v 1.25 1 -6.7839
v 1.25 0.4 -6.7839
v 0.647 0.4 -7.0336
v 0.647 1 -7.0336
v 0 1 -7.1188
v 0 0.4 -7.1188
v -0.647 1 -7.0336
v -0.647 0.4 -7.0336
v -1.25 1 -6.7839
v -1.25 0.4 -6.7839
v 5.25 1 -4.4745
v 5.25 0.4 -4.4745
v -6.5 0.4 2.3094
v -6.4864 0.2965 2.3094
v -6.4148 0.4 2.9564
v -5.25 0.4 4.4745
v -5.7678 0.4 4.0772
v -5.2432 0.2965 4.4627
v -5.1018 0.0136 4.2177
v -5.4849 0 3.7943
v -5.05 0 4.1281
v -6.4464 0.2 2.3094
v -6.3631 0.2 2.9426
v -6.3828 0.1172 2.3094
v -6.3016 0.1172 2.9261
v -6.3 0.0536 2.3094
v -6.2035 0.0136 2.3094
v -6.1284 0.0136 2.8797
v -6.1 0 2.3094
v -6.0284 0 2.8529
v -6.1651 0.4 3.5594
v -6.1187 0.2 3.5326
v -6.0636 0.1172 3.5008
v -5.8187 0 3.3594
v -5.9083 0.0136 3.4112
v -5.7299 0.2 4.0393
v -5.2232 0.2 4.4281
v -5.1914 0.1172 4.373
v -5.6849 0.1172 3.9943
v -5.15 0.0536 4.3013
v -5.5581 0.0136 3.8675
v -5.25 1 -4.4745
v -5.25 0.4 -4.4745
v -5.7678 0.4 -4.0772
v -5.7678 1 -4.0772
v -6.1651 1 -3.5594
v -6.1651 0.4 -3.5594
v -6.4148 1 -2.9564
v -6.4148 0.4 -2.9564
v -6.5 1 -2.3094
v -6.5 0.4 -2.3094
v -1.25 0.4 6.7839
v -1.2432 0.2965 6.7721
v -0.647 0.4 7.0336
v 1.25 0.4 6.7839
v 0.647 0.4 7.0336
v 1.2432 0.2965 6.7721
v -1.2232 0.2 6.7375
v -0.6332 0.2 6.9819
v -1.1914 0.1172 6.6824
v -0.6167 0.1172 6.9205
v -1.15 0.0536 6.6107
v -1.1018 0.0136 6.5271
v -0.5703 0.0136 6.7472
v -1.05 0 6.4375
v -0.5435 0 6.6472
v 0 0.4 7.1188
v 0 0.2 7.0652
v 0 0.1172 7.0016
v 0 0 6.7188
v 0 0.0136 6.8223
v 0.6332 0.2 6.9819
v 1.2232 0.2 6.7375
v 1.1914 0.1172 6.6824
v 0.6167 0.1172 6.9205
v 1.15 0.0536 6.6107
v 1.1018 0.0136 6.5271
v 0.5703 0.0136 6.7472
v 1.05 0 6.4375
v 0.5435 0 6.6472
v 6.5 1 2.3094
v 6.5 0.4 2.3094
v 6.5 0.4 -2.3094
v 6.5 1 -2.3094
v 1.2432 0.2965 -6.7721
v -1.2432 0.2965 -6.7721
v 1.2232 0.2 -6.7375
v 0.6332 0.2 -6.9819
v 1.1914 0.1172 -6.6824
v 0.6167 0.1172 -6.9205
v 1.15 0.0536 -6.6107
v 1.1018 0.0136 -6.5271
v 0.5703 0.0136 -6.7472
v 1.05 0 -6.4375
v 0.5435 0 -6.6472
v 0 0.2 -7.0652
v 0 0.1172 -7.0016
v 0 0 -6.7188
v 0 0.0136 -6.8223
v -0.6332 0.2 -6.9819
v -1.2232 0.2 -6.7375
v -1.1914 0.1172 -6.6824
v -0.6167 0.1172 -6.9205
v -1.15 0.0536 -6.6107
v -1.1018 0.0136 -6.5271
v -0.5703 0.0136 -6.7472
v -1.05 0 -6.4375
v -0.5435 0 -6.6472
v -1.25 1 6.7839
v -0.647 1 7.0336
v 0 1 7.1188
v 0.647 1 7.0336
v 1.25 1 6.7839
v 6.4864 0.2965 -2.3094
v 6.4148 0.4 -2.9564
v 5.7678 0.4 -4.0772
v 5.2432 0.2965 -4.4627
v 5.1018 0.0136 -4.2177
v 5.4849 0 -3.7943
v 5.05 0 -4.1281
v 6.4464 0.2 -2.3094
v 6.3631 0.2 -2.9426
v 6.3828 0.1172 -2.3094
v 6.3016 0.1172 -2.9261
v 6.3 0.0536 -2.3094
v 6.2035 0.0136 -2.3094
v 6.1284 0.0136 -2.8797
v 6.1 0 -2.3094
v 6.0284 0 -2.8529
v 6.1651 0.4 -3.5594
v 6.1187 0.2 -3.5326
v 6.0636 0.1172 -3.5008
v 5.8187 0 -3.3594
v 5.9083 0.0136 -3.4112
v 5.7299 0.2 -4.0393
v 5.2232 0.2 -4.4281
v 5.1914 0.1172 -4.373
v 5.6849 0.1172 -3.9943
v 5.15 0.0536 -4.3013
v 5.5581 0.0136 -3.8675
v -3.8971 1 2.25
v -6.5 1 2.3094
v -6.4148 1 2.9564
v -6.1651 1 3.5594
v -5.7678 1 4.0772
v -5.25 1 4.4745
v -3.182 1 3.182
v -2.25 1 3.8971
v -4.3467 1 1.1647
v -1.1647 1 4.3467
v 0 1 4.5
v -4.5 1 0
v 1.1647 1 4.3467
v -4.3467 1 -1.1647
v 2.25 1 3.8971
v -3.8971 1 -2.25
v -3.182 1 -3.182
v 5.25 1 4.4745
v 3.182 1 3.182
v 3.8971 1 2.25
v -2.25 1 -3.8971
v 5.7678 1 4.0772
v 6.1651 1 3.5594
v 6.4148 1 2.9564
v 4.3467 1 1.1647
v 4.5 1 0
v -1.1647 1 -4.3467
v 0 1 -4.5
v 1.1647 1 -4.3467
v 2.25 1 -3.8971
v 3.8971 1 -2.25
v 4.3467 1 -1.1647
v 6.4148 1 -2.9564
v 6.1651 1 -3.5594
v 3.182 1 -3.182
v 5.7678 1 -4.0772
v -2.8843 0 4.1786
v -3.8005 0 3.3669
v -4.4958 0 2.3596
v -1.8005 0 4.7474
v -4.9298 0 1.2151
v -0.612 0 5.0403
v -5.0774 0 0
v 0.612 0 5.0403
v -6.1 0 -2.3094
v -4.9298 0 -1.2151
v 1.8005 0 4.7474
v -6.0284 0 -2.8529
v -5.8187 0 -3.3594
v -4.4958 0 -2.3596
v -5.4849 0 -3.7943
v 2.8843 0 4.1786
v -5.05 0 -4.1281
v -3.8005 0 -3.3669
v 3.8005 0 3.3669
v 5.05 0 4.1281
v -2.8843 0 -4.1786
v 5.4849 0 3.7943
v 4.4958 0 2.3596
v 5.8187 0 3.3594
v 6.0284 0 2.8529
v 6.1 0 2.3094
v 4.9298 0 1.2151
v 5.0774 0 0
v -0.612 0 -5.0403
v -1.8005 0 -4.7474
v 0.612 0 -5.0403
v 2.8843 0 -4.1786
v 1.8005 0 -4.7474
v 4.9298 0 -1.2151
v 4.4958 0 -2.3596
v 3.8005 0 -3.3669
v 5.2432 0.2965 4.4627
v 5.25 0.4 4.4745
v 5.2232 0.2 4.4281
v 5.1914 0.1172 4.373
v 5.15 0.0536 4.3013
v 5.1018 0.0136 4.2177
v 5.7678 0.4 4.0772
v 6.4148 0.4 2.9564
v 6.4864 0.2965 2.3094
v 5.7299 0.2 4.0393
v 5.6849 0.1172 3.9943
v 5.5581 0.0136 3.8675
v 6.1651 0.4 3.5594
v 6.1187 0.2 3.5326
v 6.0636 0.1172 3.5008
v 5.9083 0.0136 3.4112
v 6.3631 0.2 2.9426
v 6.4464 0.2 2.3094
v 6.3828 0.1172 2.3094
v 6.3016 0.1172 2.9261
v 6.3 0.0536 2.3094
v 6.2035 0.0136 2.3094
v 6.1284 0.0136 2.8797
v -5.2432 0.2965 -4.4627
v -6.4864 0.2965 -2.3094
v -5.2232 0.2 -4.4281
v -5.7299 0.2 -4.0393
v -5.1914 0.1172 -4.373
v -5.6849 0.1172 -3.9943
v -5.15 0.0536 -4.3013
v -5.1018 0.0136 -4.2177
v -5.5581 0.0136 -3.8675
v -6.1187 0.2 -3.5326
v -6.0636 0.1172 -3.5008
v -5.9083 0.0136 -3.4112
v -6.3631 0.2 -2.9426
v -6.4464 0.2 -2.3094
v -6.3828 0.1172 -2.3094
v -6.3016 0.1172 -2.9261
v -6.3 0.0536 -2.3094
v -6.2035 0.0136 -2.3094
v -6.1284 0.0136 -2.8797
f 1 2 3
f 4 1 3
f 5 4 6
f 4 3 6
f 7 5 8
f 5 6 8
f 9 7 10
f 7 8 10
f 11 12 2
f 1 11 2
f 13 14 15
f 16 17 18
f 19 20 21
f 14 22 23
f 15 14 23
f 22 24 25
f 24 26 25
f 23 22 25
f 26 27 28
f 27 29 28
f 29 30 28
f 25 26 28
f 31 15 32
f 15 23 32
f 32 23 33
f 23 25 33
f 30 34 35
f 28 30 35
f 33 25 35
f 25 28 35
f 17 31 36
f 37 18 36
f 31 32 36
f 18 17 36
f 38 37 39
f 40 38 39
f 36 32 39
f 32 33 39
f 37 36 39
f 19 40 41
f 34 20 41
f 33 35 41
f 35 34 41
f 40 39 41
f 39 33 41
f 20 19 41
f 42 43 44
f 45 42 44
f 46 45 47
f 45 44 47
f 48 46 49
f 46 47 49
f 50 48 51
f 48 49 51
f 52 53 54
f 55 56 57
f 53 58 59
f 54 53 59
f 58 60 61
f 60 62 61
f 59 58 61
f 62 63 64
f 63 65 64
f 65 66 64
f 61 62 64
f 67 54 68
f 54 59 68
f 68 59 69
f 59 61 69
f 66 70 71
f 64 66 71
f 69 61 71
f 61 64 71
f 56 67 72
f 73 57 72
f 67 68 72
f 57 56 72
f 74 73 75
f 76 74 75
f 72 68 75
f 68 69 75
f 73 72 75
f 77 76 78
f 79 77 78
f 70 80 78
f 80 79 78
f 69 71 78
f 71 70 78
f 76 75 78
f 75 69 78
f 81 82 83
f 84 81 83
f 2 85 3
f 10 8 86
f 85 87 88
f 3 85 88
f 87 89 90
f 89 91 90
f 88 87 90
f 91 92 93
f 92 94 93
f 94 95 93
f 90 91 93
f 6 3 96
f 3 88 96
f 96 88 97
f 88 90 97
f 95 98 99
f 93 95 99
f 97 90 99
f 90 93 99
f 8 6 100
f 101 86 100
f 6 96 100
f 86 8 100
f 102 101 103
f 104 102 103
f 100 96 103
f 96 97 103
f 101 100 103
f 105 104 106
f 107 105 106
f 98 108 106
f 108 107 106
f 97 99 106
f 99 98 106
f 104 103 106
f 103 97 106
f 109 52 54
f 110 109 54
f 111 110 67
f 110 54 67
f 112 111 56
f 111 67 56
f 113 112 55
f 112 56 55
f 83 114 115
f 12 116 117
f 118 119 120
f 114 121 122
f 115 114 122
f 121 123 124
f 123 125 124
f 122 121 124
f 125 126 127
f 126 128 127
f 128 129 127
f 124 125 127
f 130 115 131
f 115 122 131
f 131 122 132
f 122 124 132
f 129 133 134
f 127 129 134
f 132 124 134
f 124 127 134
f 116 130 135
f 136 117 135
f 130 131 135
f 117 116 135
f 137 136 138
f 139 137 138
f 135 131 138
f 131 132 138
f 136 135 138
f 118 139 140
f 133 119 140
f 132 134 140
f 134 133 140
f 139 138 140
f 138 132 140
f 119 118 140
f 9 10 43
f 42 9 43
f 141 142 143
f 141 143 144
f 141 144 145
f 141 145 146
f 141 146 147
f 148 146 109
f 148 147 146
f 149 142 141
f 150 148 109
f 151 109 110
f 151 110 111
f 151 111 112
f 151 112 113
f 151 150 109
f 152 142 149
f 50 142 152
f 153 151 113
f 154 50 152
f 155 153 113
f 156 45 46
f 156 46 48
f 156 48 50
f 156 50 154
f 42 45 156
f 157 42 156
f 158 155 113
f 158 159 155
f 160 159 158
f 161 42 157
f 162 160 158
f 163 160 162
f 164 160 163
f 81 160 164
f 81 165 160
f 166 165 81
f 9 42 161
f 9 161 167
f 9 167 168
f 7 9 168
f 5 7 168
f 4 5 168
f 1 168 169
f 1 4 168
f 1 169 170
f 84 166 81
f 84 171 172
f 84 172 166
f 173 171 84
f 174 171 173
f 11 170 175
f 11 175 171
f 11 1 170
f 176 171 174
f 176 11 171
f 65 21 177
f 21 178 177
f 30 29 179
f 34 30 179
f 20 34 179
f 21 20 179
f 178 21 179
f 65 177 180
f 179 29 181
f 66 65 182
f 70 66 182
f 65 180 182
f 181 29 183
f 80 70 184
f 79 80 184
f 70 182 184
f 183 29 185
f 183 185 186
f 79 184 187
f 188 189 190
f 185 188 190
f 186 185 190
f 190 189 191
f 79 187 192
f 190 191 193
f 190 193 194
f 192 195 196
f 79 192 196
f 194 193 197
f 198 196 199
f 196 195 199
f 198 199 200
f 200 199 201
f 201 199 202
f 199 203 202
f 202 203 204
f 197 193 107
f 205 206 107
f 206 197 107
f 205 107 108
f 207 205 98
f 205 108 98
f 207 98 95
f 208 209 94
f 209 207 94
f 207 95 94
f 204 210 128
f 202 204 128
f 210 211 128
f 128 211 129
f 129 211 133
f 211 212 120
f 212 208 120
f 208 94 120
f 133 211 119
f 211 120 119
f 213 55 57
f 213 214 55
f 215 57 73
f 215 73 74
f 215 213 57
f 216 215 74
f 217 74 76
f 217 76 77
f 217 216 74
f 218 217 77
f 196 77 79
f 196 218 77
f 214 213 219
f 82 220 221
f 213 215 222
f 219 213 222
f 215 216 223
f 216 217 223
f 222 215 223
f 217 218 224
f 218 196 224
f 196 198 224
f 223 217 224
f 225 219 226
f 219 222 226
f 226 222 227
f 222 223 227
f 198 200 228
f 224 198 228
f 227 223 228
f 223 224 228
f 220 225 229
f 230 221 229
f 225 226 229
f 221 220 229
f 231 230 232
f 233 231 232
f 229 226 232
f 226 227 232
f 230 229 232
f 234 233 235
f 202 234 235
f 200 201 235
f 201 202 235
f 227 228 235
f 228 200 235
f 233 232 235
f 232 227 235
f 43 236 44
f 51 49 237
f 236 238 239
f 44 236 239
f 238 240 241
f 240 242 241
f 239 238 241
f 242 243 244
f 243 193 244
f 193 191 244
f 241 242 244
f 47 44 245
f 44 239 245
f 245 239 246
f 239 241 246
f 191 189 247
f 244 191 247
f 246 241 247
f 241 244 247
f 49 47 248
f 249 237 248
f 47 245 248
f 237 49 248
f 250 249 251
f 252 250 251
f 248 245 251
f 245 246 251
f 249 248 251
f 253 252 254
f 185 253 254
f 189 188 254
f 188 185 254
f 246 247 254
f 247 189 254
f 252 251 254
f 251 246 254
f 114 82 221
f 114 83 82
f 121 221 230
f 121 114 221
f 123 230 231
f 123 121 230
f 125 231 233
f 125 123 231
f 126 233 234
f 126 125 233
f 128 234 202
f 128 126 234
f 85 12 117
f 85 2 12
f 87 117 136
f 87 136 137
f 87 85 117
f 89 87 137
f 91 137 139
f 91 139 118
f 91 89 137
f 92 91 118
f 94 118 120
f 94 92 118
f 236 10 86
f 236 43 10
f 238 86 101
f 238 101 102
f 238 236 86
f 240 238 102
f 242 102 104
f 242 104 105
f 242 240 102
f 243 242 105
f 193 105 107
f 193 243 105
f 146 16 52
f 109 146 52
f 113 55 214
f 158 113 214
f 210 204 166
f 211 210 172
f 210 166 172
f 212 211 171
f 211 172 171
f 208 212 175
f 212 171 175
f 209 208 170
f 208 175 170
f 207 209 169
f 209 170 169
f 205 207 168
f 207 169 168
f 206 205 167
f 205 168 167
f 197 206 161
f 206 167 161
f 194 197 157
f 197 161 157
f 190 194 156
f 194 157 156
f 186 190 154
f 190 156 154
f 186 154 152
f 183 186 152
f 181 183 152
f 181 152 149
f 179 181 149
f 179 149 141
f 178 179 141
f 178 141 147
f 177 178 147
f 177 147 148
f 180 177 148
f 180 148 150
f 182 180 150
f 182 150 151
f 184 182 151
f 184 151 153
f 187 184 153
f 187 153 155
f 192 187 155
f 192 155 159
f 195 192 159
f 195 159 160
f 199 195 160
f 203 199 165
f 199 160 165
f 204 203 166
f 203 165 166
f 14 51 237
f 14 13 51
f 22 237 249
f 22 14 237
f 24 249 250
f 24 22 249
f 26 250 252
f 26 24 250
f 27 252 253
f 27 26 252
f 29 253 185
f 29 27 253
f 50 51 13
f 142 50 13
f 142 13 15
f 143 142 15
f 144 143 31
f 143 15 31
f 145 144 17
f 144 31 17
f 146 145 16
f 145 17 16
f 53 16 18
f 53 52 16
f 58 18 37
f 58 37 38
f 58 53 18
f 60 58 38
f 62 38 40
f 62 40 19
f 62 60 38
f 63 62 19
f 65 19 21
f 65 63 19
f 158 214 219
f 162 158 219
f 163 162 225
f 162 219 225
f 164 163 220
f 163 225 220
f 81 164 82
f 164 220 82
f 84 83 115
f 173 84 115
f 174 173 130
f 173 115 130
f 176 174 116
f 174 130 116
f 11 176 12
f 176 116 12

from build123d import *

# Parameters (mm, degrees)
SKETCH1_R           = 4.5
BOSS_EXTRUDE1_DEPTH = 1
SKETCH5_R           = 4.5
CUT_EXTRUDE1_DEPTH  = 1
CUT_EXTRUDE1_DRAFT  = 30
FILLET2_R           = 0.4


with BuildPart() as part:
    # Sketch1 → Boss-Extrude1 (new body)
    with BuildSketch(Plane(origin=(0, 0, 0), x_dir=(1, 0, 0), z_dir=(0, 1, 0))):
        with BuildLine():
            Line((6.5, -2.309401077), (6.5, 2.309401077))
            ThreePointArc((6.5, 2.309401077), (6.165063509, 3.559401077), (5.25, 4.474464586))
            Line((5.25, 4.474464586), (1.25, 6.783865663))
            ThreePointArc((1.25, 6.783865663), (0, 7.118802154), (-1.25, 6.783865663))
            Line((-1.25, 6.783865663), (-5.25, 4.474464586))
            ThreePointArc((-5.25, 4.474464586), (-6.165063509, 3.559401077), (-6.5, 2.309401077))
            Line((-6.5, 2.309401077), (-6.5, -2.309401077))
            ThreePointArc((-6.5, -2.309401077), (-6.165063509, -3.559401077), (-5.25, -4.474464586))
            Line((-5.25, -4.474464586), (-1.25, -6.783865663))
            ThreePointArc((-1.25, -6.783865663), (0, -7.118802154), (1.25, -6.783865663))
            Line((1.25, -6.783865663), (5.25, -4.474464586))
            ThreePointArc((5.25, -4.474464586), (6.165063509, -3.559401077), (6.5, -2.309401077))
        make_face()
        Circle(SKETCH1_R, mode=Mode.SUBTRACT)
    extrude(amount=BOSS_EXTRUDE1_DEPTH)


with BuildPart() as cut_extrude1_tool:
    # Sketch5 → Cut-Extrude1 (with draft: the straight prism first)
    with BuildSketch(Plane(origin=(0, 1, 0), x_dir=(1, 0, 0), z_dir=(0, 1, 0))):
        Circle(SKETCH5_R)
    extrude(amount=-CUT_EXTRUDE1_DEPTH)
    # Cut-Extrude1: the draft: its side faces are tilted about the plane it starts from
    cut_extrude1_sides = [cut_extrude1_tool.faces().sort_by_distance(p)[0] for p in [
        (-4.5, 0.5, 0),
    ]]
    draft(cut_extrude1_sides, Plane(origin=(0, 1, 0), x_dir=(1, 0, 0), z_dir=(0, 1, 0)), CUT_EXTRUDE1_DRAFT)


with BuildPart() as part_1:
    add(part.part)

    # Cut-Extrude1: cut by cut_extrude1_tool
    add(cut_extrude1_tool.part, mode=Mode.SUBTRACT)

    # Fillet2
    fillet2_edges = [part_1.edges().sort_by_distance(p)[0] for p in [
        (6.165063509, 0, 3.559401077),
        (3.25, 0, 5.629165125),
        (0, 0, 7.118802154),
        (-3.25, 0, 5.629165125),
        (-6.165063509, 0, 3.559401077),
        (-6.5, 0, 0),
        (-6.165063509, 0, -3.559401077),
        (-3.25, 0, -5.629165125),
        (0, 0, -7.118802154),
        (3.25, 0, -5.629165125),
        (6.165063509, 0, -3.559401077),
        (6.5, 0, 0),
    ]]
    fillet(fillet2_edges, radius=FILLET2_R)


solid = part_1.part
